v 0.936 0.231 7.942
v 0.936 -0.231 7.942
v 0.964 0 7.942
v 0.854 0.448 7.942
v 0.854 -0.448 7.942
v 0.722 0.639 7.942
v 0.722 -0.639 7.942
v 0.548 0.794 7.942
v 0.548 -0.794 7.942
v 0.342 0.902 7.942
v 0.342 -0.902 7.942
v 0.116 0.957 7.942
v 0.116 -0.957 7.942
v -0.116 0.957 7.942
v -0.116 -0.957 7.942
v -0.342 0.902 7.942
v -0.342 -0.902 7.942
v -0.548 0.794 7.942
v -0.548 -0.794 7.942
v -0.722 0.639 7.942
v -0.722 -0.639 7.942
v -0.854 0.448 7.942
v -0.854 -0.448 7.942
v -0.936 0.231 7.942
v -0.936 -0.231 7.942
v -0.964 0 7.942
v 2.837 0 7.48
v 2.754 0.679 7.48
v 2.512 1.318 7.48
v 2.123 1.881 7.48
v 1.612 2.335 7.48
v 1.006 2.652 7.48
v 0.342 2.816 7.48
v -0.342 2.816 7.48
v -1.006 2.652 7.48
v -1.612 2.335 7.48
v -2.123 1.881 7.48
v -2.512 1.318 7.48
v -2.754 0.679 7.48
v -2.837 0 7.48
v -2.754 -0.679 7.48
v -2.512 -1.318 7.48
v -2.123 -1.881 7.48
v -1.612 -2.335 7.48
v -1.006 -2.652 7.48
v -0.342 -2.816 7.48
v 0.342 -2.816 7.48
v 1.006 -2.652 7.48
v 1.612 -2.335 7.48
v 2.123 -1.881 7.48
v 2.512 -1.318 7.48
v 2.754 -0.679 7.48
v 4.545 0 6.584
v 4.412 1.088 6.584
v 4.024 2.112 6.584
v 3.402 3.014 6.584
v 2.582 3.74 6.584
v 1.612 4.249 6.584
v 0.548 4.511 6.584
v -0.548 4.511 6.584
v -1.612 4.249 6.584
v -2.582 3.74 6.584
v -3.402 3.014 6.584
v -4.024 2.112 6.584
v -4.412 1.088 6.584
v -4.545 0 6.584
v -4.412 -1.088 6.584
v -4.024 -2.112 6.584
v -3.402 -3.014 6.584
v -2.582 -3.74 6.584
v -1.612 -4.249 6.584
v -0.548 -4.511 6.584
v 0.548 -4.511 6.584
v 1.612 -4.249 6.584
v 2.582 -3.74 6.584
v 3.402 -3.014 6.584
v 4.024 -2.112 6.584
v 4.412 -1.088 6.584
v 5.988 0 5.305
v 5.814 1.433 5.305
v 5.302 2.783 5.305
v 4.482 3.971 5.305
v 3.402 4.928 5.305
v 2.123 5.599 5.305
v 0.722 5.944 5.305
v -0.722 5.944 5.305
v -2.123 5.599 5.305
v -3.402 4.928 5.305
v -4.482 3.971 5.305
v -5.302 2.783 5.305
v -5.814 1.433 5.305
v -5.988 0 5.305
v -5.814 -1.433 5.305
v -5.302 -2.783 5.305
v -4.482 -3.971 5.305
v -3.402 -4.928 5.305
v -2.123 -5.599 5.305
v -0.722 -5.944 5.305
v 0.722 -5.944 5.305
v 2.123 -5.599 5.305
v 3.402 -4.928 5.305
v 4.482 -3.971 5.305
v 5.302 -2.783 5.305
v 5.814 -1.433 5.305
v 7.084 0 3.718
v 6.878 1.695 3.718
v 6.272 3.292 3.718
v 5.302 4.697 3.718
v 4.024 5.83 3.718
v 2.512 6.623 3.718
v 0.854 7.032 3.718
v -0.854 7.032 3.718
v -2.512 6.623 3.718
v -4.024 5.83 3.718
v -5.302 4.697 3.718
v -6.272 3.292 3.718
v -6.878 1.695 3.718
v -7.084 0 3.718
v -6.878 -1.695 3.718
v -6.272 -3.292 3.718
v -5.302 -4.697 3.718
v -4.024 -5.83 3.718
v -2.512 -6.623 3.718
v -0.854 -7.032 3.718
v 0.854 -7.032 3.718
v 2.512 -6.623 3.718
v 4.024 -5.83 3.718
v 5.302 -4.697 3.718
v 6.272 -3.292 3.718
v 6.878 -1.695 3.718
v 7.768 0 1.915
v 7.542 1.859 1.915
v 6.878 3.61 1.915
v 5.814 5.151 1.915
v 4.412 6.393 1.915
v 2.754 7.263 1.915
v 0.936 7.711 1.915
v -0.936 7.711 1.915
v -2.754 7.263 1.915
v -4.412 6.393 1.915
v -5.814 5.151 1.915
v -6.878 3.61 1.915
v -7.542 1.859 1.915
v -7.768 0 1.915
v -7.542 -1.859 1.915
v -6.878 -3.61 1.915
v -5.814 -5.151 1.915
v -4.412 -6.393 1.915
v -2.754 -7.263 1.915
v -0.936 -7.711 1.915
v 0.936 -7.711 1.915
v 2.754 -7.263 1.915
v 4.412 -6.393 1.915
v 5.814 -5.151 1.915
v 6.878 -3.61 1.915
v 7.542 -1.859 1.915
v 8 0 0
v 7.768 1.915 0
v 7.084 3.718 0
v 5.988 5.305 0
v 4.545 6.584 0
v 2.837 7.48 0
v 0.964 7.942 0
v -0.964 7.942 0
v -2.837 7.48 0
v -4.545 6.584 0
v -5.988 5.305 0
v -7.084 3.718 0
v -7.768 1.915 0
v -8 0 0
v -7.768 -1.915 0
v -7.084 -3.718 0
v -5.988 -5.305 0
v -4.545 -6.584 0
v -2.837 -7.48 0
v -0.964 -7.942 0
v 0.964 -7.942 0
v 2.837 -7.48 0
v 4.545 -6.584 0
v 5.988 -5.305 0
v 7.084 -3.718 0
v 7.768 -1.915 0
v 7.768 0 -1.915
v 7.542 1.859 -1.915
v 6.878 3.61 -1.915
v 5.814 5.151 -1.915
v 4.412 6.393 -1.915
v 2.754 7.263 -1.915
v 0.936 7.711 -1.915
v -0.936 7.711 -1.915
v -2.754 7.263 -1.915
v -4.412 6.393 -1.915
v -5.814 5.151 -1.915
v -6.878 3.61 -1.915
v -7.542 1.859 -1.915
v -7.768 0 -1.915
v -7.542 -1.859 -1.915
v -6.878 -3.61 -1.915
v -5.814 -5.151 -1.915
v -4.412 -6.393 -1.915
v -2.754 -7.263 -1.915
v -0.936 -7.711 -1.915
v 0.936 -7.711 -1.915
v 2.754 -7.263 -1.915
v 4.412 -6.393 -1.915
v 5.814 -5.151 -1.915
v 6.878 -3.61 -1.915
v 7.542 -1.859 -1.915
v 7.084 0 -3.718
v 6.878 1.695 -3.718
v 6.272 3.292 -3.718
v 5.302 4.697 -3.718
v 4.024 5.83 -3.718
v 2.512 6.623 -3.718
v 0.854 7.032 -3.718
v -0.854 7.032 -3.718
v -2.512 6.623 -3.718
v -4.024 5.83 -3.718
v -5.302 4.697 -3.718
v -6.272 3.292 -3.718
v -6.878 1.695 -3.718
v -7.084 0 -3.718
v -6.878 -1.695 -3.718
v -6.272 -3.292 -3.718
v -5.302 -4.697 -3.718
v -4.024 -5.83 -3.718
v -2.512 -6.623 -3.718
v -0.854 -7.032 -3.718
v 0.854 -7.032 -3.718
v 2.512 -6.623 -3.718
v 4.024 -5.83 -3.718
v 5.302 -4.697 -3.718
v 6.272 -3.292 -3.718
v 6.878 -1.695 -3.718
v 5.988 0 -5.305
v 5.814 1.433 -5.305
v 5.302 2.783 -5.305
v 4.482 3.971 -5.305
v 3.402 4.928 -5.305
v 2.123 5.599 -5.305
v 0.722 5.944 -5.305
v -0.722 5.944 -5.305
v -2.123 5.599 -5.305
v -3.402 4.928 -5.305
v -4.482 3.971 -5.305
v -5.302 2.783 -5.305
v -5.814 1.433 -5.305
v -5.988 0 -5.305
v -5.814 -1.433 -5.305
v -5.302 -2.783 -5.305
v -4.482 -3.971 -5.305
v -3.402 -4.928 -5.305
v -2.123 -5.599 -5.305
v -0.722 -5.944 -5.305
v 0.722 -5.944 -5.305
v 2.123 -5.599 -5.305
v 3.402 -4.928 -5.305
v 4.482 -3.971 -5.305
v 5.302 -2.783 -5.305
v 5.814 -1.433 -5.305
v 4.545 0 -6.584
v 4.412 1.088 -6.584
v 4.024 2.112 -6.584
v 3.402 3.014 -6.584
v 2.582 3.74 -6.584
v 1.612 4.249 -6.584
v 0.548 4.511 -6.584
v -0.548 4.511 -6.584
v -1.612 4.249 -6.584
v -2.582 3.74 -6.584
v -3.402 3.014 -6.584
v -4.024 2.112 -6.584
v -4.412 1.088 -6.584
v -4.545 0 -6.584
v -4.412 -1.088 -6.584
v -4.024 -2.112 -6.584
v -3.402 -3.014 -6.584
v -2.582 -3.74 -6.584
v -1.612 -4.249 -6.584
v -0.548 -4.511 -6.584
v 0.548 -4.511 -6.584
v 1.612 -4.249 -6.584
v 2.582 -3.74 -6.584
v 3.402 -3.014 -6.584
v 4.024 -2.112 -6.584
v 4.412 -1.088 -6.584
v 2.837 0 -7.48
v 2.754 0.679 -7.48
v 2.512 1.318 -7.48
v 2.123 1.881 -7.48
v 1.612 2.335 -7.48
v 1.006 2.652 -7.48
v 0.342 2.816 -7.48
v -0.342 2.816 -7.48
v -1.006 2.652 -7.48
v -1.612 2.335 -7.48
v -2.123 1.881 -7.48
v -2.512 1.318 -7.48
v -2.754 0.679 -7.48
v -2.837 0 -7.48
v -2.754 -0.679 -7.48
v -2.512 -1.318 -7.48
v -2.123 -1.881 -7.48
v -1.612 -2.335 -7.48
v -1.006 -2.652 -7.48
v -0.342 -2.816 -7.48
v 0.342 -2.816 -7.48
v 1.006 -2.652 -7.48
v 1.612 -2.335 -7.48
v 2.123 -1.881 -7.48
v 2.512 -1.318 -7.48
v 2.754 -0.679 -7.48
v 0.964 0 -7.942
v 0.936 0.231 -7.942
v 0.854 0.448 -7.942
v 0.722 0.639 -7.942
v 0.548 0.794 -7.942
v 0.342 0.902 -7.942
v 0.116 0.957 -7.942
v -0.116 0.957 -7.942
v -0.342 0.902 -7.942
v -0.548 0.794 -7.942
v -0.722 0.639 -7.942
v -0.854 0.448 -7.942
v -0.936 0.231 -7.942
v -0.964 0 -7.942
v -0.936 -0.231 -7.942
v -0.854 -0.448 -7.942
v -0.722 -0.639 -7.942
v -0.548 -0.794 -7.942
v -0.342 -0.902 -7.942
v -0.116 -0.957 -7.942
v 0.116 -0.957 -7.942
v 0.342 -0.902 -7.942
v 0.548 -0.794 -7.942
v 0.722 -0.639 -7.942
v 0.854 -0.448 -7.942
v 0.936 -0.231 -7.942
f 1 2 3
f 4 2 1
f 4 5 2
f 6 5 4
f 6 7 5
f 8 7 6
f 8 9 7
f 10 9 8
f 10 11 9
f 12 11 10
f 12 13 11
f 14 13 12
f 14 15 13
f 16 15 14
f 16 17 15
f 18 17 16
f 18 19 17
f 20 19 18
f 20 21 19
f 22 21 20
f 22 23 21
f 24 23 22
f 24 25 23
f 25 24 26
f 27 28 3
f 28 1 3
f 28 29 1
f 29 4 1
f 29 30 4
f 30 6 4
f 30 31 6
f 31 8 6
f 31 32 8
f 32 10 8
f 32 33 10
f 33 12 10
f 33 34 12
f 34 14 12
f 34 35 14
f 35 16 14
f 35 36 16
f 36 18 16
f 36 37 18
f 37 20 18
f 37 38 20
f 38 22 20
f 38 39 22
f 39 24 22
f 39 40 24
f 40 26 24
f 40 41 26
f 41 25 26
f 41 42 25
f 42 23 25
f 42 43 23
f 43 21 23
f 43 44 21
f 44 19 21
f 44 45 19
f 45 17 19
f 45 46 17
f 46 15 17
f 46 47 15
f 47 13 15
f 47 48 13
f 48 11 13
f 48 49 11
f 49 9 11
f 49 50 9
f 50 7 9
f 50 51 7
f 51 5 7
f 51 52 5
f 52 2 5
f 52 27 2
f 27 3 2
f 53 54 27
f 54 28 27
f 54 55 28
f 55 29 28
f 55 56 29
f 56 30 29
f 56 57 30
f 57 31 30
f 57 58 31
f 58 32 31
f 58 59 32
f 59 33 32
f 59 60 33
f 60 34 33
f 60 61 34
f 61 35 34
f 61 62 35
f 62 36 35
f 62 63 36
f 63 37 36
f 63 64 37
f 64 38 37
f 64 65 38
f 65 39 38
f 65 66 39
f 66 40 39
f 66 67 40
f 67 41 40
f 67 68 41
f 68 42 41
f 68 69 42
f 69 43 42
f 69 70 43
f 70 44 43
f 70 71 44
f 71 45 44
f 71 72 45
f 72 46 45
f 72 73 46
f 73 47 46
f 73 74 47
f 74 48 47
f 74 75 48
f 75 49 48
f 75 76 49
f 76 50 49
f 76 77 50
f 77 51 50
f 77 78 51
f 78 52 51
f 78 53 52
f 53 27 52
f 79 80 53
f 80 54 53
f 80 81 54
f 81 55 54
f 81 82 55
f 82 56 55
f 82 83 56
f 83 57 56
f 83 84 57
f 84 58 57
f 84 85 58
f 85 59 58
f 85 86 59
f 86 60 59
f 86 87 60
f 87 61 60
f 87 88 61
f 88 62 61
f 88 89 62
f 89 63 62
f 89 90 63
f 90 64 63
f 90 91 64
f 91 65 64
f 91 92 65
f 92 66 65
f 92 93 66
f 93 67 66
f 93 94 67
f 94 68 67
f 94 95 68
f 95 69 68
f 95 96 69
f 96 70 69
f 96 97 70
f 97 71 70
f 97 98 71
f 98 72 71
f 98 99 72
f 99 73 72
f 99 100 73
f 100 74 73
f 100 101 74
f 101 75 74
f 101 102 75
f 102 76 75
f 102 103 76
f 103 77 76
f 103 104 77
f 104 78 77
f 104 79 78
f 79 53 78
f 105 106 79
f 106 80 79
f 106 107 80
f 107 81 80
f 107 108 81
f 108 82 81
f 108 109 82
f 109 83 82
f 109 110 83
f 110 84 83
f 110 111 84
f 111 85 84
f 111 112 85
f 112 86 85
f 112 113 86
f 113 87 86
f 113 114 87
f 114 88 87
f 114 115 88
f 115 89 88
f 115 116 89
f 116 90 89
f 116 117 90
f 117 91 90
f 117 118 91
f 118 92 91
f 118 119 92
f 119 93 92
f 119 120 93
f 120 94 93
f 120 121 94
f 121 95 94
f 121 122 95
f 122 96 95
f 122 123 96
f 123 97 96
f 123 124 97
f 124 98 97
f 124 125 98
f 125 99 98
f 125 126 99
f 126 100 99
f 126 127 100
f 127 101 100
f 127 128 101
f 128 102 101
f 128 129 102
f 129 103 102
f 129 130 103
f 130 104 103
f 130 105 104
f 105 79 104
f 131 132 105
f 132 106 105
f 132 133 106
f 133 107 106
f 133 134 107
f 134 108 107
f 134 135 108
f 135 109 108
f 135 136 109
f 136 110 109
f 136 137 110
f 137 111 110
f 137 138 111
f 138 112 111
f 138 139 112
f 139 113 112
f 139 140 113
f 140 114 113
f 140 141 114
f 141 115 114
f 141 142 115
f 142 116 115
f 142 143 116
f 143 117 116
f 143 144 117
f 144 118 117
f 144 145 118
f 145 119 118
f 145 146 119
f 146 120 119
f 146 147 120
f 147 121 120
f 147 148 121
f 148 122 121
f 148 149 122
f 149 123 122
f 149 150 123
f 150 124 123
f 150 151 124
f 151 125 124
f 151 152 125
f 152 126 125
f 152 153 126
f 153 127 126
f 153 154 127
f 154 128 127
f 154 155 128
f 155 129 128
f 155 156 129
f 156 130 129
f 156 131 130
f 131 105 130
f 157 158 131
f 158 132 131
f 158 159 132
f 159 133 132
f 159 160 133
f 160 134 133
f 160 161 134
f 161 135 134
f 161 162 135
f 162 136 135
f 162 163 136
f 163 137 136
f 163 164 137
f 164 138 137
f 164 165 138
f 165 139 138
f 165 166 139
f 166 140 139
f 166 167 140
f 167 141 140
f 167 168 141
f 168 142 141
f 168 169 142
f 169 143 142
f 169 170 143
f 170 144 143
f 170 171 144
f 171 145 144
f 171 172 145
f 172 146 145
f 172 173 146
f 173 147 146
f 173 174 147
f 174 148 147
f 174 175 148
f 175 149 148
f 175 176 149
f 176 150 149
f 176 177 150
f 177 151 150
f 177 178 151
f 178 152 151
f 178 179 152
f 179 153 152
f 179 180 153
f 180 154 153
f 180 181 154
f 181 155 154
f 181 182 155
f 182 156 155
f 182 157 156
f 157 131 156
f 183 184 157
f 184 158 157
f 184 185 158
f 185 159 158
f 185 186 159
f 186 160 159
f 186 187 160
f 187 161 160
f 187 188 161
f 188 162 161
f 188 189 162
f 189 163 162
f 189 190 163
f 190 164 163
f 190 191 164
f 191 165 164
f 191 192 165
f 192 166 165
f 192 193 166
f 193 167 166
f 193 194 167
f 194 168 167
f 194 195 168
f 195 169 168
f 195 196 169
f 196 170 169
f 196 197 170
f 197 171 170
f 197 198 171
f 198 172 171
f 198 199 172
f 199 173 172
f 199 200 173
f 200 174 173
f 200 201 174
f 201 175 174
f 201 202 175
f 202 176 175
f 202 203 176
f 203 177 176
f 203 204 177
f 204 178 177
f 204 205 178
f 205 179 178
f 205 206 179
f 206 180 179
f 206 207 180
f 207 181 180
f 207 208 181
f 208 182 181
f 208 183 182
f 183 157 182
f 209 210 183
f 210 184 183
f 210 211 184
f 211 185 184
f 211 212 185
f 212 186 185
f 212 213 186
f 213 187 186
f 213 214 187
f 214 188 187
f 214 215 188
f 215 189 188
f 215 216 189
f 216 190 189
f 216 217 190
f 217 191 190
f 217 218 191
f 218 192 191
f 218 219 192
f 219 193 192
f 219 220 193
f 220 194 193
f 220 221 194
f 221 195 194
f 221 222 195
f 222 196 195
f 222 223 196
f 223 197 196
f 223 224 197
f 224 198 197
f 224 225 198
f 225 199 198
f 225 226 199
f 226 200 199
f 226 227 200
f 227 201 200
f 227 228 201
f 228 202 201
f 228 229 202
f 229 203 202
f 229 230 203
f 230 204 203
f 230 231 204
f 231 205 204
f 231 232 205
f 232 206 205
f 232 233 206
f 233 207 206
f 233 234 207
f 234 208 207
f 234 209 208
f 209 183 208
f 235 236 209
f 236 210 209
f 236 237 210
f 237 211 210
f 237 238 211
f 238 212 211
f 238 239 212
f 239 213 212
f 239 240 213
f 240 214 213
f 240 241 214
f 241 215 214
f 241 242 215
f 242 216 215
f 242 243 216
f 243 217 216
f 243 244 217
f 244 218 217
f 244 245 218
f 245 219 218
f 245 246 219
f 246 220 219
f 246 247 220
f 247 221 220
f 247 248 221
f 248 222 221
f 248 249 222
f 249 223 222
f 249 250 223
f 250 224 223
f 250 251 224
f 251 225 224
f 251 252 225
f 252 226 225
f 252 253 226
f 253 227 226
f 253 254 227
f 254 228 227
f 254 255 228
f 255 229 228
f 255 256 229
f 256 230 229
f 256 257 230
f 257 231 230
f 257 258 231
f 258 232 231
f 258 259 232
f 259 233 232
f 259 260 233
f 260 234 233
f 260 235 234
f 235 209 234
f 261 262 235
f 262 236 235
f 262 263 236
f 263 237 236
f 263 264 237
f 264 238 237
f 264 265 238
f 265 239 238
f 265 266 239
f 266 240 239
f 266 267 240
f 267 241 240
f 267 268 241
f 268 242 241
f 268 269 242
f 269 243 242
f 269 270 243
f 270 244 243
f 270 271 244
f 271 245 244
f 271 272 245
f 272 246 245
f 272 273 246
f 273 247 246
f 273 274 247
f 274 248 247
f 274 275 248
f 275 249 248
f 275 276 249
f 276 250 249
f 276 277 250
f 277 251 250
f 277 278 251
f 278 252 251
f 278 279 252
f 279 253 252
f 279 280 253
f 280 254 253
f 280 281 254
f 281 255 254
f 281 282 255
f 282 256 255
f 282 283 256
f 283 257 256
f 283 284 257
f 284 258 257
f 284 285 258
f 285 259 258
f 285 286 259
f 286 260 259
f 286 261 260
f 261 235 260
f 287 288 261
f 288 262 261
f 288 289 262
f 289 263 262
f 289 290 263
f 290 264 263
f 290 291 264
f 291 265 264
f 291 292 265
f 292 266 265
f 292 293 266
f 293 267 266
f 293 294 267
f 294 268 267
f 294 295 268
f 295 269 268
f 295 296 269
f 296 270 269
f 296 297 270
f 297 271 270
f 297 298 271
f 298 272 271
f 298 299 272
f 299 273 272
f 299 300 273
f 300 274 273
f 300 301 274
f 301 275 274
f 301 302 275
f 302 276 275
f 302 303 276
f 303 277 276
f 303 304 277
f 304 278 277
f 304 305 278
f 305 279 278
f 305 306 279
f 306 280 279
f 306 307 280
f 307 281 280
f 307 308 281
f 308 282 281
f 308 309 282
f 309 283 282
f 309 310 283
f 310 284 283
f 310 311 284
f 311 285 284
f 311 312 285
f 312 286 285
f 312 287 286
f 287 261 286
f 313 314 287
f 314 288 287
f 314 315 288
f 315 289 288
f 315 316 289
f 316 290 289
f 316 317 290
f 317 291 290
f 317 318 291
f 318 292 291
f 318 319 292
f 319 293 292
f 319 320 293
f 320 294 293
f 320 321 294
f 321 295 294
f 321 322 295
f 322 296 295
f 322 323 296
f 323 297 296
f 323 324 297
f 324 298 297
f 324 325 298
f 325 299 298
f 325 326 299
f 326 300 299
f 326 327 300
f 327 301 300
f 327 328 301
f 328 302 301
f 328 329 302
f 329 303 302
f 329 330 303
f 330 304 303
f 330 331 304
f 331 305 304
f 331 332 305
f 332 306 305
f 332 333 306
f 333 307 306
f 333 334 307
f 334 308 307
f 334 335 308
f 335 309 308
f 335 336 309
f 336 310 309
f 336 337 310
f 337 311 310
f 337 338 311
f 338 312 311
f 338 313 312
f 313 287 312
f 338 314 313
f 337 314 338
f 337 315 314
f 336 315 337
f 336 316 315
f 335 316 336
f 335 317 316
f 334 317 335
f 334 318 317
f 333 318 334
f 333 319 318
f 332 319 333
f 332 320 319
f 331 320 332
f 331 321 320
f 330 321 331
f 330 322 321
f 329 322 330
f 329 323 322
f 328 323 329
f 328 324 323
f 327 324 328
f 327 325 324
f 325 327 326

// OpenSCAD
// no $fn: exercises the $fa=12/$fs=2 default fragment count on both sides
sphere(r = 8);
